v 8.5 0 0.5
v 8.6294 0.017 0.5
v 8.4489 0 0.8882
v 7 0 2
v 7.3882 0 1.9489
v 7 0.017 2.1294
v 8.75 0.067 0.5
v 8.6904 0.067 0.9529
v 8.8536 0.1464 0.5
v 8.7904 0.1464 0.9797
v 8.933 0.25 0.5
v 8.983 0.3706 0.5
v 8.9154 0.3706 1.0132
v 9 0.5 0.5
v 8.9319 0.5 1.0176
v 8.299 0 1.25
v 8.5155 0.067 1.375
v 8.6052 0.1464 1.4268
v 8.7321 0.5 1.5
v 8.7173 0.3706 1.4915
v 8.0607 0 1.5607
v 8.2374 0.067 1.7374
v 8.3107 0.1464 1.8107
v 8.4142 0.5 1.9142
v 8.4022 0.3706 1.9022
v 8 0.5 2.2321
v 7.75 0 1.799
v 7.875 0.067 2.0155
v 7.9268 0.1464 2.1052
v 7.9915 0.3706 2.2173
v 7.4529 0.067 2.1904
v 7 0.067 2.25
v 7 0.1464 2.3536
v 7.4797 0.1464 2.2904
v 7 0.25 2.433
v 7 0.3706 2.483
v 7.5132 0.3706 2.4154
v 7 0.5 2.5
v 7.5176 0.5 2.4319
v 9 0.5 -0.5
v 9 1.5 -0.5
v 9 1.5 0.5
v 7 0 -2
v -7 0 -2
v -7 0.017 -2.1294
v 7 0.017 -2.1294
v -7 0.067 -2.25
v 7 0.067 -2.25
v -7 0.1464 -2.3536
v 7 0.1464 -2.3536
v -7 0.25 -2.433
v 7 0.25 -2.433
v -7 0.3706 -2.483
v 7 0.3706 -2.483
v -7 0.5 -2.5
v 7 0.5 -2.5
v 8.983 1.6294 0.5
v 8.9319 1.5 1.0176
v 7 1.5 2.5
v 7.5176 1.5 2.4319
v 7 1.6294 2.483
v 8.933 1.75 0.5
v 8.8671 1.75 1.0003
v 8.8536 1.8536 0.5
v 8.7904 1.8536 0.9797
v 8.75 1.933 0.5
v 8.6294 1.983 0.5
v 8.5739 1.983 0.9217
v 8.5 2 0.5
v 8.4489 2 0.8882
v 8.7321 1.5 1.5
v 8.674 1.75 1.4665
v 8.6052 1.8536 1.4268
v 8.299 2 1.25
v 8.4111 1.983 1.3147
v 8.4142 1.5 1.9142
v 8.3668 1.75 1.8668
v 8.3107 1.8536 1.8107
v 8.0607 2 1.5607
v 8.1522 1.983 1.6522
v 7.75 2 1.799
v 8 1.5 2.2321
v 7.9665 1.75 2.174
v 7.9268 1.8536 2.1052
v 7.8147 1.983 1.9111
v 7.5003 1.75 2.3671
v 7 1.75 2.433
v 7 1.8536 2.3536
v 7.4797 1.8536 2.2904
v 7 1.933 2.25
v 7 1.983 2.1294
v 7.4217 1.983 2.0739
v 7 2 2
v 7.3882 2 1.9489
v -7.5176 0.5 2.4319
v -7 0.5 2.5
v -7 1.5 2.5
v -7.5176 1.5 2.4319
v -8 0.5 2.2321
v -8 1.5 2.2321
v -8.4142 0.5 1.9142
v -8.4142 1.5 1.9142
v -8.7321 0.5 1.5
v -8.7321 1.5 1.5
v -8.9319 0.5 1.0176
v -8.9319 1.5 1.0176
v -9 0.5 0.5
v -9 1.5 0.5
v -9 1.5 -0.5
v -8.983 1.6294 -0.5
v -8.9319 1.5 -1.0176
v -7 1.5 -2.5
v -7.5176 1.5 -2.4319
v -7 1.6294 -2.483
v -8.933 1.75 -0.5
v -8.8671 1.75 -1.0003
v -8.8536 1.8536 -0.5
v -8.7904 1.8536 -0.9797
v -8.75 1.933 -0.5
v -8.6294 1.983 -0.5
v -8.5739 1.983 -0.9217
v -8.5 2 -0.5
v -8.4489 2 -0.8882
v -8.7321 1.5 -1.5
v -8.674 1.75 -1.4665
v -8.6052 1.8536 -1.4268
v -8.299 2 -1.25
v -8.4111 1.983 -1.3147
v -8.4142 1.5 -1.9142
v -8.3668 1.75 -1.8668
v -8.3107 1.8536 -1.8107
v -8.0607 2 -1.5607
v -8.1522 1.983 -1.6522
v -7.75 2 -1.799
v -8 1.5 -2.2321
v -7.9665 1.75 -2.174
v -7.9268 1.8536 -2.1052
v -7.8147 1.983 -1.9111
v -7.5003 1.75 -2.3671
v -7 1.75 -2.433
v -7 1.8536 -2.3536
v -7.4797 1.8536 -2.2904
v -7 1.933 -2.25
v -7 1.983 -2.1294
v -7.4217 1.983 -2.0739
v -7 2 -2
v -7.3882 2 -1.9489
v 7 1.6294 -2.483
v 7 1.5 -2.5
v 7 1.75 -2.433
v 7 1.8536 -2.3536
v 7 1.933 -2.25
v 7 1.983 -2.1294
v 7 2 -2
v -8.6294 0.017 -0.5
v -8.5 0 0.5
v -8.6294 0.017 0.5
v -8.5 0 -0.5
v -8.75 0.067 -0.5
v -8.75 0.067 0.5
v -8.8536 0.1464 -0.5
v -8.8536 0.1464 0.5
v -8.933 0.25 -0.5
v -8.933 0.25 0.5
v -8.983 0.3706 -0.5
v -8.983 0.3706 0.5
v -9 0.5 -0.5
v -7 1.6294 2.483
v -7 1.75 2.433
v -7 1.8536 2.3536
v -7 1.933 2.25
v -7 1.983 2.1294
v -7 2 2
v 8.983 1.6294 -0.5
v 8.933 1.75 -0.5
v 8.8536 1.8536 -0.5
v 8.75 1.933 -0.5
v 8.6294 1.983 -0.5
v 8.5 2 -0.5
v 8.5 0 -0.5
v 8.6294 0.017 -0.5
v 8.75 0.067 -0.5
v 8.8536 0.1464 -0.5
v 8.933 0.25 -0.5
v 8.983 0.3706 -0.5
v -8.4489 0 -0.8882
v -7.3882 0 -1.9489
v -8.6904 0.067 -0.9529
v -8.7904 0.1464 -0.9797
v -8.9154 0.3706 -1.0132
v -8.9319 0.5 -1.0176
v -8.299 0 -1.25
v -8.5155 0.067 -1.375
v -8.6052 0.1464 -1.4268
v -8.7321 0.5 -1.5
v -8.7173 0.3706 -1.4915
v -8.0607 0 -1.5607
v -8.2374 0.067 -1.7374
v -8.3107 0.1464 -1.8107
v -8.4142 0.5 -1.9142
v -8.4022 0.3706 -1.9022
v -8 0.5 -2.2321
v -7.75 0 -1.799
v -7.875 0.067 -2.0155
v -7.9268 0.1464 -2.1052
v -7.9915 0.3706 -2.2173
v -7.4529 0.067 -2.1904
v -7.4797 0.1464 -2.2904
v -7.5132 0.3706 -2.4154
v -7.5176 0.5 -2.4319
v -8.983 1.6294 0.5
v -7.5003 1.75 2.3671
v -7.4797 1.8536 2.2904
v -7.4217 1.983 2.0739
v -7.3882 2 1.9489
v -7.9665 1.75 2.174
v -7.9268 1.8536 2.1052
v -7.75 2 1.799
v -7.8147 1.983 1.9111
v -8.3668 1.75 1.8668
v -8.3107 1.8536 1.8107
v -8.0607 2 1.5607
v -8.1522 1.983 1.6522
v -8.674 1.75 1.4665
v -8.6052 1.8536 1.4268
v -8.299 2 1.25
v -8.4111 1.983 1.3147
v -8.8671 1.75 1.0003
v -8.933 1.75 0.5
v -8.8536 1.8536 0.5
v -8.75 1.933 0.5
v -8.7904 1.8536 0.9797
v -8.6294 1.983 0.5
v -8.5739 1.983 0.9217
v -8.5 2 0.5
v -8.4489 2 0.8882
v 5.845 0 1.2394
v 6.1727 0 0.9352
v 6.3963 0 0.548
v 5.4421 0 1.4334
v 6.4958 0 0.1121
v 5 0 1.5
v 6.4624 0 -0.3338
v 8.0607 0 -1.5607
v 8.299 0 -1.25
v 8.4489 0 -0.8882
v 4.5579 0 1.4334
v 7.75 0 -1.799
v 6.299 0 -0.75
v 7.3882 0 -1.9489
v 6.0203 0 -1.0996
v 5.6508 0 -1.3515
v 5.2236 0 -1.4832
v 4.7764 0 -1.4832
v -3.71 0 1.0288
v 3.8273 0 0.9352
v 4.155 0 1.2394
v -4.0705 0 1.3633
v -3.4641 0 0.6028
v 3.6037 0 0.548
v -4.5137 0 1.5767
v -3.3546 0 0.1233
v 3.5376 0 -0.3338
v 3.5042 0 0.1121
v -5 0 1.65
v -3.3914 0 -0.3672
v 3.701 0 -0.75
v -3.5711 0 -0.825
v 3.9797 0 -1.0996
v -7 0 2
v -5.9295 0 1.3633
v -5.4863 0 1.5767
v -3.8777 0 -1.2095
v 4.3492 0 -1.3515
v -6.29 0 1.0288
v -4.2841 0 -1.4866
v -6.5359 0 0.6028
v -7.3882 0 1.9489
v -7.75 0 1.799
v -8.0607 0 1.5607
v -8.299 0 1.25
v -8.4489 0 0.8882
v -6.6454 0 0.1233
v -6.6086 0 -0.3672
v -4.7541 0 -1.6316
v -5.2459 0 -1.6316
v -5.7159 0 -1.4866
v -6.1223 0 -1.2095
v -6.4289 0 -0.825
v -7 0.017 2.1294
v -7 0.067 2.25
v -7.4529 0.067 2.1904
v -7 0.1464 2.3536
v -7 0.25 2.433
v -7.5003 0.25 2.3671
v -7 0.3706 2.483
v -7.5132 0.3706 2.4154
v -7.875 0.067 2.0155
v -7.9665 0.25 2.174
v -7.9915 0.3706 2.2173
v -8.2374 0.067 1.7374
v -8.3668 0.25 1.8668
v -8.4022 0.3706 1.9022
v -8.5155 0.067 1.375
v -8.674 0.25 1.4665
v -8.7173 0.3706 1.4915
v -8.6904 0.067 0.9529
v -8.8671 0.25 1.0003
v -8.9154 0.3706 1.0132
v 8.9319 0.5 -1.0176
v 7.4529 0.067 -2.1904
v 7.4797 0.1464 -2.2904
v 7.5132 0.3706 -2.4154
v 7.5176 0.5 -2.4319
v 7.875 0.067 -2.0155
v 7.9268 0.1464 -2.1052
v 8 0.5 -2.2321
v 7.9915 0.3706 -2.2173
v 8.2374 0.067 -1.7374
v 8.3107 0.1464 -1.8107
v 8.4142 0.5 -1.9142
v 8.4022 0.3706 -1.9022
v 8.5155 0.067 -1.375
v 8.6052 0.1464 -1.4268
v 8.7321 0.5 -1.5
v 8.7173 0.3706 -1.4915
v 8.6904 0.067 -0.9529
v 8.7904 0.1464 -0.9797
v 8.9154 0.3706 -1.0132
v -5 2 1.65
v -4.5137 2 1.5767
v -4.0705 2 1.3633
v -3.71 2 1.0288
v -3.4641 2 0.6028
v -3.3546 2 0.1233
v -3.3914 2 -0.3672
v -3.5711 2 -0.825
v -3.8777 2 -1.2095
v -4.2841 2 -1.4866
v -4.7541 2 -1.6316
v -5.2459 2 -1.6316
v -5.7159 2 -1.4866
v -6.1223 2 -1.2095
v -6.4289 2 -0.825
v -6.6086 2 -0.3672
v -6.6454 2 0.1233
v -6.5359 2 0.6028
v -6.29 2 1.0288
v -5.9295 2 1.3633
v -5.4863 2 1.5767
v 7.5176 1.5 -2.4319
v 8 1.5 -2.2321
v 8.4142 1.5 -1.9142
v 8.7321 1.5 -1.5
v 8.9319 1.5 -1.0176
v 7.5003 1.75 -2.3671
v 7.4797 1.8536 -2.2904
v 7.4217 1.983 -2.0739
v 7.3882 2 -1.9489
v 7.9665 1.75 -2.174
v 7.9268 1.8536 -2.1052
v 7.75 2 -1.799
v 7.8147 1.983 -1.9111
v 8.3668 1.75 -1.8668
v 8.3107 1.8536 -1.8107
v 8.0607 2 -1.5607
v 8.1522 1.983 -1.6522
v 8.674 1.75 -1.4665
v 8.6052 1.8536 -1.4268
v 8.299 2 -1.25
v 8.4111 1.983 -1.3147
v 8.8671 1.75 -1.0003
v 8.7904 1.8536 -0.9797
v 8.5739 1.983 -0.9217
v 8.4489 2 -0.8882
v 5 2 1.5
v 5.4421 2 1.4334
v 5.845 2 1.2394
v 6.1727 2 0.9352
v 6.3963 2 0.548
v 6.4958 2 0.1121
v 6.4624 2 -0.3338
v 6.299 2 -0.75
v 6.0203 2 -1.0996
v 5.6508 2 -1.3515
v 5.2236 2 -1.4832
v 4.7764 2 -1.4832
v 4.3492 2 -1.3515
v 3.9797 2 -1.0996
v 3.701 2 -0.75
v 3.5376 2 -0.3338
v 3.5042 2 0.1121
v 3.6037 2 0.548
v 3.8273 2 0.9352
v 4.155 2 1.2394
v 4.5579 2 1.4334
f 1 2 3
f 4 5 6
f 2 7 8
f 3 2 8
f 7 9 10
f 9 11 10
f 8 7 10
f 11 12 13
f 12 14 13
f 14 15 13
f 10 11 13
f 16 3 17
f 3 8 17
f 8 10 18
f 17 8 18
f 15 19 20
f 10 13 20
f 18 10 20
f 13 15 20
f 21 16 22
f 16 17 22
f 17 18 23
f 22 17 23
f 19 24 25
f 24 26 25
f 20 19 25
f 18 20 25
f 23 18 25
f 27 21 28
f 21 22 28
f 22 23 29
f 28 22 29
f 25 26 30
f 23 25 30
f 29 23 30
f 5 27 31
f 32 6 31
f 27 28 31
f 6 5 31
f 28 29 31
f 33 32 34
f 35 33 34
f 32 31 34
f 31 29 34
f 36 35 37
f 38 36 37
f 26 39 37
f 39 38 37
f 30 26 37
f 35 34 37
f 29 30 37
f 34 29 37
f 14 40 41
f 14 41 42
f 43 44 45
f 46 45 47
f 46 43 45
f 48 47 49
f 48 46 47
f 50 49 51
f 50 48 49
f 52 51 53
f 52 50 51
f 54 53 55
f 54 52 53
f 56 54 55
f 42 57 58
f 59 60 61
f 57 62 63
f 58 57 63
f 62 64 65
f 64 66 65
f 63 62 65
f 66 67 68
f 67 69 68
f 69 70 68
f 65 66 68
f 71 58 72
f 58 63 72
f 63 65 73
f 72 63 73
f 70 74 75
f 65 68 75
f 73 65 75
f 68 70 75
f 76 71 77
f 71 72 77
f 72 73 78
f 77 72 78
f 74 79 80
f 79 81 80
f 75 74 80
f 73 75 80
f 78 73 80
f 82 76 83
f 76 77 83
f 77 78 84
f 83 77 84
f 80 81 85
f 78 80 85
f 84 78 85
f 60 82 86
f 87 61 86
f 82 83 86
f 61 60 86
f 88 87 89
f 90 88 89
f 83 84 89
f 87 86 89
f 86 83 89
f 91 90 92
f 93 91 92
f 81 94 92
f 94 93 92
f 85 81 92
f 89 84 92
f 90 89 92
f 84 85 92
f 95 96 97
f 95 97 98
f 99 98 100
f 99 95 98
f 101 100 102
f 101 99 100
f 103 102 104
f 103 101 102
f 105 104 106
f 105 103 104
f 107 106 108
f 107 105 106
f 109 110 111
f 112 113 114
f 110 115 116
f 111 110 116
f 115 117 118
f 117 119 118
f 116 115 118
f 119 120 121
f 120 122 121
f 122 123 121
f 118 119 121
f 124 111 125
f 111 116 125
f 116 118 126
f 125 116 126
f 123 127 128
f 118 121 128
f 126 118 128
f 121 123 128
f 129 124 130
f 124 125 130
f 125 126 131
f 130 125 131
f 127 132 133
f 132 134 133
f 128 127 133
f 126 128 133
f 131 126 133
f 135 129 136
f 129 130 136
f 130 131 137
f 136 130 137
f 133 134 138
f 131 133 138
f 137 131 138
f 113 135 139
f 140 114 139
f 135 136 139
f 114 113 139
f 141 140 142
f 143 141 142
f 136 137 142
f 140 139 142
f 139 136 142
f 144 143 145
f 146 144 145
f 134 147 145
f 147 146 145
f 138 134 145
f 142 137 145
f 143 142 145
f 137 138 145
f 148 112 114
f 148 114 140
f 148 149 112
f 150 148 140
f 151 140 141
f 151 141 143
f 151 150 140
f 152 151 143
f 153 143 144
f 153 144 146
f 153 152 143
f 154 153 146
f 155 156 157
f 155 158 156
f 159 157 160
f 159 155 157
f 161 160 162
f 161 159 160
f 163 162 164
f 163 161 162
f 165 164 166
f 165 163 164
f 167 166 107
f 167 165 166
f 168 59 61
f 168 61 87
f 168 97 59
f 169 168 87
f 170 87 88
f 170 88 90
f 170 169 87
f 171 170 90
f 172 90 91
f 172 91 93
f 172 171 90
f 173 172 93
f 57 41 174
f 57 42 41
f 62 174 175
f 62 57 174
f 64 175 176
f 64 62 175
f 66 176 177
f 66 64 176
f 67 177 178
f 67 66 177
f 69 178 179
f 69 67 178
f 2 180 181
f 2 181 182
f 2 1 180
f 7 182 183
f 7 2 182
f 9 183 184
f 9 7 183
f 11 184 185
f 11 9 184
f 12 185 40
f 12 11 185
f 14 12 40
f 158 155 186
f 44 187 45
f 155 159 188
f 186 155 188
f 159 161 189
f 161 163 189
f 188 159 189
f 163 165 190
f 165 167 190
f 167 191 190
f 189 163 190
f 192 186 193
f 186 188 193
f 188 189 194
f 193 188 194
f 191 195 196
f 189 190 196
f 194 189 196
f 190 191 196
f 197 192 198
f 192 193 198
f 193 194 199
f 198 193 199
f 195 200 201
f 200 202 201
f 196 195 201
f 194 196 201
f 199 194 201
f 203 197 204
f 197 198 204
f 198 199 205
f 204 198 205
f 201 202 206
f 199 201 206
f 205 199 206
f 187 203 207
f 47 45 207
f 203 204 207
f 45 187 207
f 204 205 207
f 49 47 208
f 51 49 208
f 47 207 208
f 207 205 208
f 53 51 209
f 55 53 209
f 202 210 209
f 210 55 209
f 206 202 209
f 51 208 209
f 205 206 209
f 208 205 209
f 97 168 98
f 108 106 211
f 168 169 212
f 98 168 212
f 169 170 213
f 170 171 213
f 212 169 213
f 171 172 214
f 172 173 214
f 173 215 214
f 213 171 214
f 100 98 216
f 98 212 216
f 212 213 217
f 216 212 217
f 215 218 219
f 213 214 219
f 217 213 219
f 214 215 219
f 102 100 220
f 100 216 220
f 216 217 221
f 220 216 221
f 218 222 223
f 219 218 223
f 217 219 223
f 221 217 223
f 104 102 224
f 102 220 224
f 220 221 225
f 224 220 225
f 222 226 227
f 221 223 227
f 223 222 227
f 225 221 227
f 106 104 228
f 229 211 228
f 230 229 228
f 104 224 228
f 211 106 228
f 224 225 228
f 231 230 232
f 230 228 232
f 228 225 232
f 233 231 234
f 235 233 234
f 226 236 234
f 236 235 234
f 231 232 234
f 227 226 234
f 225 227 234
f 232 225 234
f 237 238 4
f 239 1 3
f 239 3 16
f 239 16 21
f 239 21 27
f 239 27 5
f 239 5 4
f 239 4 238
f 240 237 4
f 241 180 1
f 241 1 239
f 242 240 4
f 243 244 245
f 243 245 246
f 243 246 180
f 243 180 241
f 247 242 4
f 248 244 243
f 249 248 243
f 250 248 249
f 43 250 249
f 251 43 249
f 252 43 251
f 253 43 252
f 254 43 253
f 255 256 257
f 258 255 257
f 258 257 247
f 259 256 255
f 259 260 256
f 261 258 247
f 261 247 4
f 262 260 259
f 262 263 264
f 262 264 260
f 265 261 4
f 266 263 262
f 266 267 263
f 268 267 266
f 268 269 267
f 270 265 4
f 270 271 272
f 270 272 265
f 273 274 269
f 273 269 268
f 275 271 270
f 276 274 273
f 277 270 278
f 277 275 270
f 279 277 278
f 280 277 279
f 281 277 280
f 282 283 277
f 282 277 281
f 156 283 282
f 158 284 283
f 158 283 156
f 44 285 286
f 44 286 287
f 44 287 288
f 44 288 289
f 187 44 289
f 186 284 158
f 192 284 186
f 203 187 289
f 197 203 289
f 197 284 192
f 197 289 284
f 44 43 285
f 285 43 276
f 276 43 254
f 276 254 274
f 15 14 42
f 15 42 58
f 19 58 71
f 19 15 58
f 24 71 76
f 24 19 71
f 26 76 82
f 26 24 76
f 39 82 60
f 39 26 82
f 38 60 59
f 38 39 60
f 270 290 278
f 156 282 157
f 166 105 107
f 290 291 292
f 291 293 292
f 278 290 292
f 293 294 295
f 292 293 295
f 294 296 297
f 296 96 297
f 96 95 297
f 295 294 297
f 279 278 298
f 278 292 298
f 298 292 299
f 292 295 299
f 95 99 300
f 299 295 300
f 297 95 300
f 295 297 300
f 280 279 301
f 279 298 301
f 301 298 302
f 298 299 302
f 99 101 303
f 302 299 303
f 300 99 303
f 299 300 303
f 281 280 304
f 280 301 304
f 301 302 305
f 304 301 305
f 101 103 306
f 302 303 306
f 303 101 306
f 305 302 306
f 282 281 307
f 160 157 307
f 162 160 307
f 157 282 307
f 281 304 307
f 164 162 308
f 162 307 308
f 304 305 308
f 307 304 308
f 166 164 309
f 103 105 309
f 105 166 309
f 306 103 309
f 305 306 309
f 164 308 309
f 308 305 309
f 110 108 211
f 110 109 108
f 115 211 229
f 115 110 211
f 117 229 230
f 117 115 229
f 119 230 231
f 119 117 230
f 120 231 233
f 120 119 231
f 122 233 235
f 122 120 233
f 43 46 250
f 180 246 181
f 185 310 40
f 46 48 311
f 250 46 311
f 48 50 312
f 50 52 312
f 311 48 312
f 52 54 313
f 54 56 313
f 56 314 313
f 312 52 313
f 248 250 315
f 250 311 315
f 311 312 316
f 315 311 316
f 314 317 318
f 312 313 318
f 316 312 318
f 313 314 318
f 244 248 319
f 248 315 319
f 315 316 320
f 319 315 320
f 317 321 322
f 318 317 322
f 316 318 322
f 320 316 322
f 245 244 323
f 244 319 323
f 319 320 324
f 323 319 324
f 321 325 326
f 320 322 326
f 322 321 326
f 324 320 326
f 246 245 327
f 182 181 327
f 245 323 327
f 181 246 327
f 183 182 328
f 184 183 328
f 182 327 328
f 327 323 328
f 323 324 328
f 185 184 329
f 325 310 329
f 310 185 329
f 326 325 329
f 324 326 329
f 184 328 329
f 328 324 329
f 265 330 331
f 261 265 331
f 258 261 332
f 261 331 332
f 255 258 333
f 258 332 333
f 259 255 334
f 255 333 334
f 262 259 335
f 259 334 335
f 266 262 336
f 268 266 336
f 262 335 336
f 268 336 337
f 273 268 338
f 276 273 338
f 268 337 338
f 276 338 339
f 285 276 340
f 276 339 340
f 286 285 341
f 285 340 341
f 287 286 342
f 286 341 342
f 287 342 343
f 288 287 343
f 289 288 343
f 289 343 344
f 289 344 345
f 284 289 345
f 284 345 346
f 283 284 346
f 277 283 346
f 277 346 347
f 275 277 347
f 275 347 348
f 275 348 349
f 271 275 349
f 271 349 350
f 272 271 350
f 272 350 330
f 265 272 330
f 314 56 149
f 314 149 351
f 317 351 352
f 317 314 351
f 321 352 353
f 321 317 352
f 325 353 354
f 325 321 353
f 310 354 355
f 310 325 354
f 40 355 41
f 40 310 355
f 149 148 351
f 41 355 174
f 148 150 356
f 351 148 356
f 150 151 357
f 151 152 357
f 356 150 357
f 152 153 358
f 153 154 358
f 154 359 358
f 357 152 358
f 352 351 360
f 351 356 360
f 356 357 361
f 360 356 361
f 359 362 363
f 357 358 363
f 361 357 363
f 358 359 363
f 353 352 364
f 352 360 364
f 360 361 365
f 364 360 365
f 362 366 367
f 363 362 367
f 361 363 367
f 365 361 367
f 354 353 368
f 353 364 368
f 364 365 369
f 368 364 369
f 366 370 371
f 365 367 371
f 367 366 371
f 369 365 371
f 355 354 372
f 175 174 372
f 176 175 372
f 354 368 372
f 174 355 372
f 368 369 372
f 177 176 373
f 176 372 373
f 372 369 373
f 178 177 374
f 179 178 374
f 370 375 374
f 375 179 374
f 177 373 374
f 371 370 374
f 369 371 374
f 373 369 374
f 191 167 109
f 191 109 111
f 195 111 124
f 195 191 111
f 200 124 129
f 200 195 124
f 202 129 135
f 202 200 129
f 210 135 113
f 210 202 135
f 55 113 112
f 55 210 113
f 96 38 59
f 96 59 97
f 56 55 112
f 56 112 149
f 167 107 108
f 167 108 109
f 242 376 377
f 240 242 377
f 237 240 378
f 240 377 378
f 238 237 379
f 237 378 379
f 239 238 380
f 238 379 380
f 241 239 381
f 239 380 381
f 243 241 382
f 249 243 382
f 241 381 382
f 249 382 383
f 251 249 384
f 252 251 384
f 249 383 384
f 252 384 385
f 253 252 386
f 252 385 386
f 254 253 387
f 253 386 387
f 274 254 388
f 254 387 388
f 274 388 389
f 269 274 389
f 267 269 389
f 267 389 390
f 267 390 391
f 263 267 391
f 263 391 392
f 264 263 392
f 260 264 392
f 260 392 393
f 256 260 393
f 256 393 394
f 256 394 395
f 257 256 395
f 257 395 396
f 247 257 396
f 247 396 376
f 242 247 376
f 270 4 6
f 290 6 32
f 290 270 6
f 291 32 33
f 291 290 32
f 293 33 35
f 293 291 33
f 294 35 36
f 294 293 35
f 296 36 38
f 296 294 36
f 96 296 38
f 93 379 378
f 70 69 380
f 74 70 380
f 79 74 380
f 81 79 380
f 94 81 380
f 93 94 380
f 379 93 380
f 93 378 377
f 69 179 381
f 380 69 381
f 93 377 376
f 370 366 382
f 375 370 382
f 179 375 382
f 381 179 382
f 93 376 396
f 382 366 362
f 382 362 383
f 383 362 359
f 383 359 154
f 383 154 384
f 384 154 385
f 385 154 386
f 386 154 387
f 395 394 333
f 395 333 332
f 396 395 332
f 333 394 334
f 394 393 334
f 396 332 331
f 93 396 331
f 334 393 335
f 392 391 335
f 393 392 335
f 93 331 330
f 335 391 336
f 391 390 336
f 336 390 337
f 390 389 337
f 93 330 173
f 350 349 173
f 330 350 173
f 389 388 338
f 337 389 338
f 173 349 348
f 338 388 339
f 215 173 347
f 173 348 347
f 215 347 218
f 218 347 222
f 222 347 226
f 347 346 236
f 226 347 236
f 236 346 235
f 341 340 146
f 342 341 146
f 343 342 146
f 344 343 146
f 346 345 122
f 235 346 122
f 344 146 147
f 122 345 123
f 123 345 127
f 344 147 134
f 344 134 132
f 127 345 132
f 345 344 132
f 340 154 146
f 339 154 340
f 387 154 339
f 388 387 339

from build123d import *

# Parameters (mm, degrees)
EXTRUDE_1_DEPTH     = 2
SKETCH_3_R          = 1.65
SKETCH_3_R_2        = 1.5
CUT_EXTRUDE_2_DEPTH = 10.552486587
FILLET_1_R          = 0.5


with BuildPart() as part:
    # 草图1 → 凸台-拉伸1 (new body)
    with BuildSketch(Plane(origin=(0, 0, 0), x_dir=(1, 0, 0), z_dir=(0, 1, 0))):
        with BuildLine():
            Line((-7, 2.5), (7, 2.5))
            ThreePointArc((7, 2.5), (8.414213562, 1.914213562), (9, 0.5))
            Line((9, 0.5), (9, -0.5))
            ThreePointArc((9, -0.5), (8.414213562, -1.914213562), (7, -2.5))
            Line((7, -2.5), (-7, -2.5))
            ThreePointArc((-7, -2.5), (-8.414213562, -1.914213562), (-9, -0.5))
            Line((-9, -0.5), (-9, 0.5))
            ThreePointArc((-9, 0.5), (-8.414213562, 1.914213562), (-7, 2.5))
        make_face()
    extrude(amount=EXTRUDE_1_DEPTH)

    # 草图3 → 切除-拉伸2 (cut, through all)
    with BuildSketch(Plane(origin=(0, 2, 0), x_dir=(1, 0, 0), z_dir=(0, 1, 0))):
        with Locations(Location((-5, 0, 0), (0, 0, 270))):
            Circle(SKETCH_3_R)
        with Locations(Location((5, 0, 0), (0, 0, 270))):
            Circle(SKETCH_3_R_2)
    extrude(amount=-CUT_EXTRUDE_2_DEPTH, mode=Mode.SUBTRACT)

    # 圆角1
    fillet_1_edges = [part.edges().sort_by_distance(p)[0] for p in [
        (-9, 0, 0),
        (-8.414213562, 0, -1.914213562),
        (0, 0, -2.5),
        (8.414213562, 0, -1.914213562),
        (-8.414213562, 2, -1.914213562),
        (-9, 2, 0),
        (-8.414213562, 2, 1.914213562),
        (0, 2, 2.5),
        (8.414213562, 2, 1.914213562),
        (9, 2, 0),
        (8.414213562, 2, -1.914213562),
        (9, 0, 0),
        (0, 2, -2.5),
        (8.414213562, 0, 1.914213562),
        (0, 0, 2.5),
        (-8.414213562, 0, 1.914213562),
    ]]
    fillet(fillet_1_edges, radius=FILLET_1_R)


solid = part.part
